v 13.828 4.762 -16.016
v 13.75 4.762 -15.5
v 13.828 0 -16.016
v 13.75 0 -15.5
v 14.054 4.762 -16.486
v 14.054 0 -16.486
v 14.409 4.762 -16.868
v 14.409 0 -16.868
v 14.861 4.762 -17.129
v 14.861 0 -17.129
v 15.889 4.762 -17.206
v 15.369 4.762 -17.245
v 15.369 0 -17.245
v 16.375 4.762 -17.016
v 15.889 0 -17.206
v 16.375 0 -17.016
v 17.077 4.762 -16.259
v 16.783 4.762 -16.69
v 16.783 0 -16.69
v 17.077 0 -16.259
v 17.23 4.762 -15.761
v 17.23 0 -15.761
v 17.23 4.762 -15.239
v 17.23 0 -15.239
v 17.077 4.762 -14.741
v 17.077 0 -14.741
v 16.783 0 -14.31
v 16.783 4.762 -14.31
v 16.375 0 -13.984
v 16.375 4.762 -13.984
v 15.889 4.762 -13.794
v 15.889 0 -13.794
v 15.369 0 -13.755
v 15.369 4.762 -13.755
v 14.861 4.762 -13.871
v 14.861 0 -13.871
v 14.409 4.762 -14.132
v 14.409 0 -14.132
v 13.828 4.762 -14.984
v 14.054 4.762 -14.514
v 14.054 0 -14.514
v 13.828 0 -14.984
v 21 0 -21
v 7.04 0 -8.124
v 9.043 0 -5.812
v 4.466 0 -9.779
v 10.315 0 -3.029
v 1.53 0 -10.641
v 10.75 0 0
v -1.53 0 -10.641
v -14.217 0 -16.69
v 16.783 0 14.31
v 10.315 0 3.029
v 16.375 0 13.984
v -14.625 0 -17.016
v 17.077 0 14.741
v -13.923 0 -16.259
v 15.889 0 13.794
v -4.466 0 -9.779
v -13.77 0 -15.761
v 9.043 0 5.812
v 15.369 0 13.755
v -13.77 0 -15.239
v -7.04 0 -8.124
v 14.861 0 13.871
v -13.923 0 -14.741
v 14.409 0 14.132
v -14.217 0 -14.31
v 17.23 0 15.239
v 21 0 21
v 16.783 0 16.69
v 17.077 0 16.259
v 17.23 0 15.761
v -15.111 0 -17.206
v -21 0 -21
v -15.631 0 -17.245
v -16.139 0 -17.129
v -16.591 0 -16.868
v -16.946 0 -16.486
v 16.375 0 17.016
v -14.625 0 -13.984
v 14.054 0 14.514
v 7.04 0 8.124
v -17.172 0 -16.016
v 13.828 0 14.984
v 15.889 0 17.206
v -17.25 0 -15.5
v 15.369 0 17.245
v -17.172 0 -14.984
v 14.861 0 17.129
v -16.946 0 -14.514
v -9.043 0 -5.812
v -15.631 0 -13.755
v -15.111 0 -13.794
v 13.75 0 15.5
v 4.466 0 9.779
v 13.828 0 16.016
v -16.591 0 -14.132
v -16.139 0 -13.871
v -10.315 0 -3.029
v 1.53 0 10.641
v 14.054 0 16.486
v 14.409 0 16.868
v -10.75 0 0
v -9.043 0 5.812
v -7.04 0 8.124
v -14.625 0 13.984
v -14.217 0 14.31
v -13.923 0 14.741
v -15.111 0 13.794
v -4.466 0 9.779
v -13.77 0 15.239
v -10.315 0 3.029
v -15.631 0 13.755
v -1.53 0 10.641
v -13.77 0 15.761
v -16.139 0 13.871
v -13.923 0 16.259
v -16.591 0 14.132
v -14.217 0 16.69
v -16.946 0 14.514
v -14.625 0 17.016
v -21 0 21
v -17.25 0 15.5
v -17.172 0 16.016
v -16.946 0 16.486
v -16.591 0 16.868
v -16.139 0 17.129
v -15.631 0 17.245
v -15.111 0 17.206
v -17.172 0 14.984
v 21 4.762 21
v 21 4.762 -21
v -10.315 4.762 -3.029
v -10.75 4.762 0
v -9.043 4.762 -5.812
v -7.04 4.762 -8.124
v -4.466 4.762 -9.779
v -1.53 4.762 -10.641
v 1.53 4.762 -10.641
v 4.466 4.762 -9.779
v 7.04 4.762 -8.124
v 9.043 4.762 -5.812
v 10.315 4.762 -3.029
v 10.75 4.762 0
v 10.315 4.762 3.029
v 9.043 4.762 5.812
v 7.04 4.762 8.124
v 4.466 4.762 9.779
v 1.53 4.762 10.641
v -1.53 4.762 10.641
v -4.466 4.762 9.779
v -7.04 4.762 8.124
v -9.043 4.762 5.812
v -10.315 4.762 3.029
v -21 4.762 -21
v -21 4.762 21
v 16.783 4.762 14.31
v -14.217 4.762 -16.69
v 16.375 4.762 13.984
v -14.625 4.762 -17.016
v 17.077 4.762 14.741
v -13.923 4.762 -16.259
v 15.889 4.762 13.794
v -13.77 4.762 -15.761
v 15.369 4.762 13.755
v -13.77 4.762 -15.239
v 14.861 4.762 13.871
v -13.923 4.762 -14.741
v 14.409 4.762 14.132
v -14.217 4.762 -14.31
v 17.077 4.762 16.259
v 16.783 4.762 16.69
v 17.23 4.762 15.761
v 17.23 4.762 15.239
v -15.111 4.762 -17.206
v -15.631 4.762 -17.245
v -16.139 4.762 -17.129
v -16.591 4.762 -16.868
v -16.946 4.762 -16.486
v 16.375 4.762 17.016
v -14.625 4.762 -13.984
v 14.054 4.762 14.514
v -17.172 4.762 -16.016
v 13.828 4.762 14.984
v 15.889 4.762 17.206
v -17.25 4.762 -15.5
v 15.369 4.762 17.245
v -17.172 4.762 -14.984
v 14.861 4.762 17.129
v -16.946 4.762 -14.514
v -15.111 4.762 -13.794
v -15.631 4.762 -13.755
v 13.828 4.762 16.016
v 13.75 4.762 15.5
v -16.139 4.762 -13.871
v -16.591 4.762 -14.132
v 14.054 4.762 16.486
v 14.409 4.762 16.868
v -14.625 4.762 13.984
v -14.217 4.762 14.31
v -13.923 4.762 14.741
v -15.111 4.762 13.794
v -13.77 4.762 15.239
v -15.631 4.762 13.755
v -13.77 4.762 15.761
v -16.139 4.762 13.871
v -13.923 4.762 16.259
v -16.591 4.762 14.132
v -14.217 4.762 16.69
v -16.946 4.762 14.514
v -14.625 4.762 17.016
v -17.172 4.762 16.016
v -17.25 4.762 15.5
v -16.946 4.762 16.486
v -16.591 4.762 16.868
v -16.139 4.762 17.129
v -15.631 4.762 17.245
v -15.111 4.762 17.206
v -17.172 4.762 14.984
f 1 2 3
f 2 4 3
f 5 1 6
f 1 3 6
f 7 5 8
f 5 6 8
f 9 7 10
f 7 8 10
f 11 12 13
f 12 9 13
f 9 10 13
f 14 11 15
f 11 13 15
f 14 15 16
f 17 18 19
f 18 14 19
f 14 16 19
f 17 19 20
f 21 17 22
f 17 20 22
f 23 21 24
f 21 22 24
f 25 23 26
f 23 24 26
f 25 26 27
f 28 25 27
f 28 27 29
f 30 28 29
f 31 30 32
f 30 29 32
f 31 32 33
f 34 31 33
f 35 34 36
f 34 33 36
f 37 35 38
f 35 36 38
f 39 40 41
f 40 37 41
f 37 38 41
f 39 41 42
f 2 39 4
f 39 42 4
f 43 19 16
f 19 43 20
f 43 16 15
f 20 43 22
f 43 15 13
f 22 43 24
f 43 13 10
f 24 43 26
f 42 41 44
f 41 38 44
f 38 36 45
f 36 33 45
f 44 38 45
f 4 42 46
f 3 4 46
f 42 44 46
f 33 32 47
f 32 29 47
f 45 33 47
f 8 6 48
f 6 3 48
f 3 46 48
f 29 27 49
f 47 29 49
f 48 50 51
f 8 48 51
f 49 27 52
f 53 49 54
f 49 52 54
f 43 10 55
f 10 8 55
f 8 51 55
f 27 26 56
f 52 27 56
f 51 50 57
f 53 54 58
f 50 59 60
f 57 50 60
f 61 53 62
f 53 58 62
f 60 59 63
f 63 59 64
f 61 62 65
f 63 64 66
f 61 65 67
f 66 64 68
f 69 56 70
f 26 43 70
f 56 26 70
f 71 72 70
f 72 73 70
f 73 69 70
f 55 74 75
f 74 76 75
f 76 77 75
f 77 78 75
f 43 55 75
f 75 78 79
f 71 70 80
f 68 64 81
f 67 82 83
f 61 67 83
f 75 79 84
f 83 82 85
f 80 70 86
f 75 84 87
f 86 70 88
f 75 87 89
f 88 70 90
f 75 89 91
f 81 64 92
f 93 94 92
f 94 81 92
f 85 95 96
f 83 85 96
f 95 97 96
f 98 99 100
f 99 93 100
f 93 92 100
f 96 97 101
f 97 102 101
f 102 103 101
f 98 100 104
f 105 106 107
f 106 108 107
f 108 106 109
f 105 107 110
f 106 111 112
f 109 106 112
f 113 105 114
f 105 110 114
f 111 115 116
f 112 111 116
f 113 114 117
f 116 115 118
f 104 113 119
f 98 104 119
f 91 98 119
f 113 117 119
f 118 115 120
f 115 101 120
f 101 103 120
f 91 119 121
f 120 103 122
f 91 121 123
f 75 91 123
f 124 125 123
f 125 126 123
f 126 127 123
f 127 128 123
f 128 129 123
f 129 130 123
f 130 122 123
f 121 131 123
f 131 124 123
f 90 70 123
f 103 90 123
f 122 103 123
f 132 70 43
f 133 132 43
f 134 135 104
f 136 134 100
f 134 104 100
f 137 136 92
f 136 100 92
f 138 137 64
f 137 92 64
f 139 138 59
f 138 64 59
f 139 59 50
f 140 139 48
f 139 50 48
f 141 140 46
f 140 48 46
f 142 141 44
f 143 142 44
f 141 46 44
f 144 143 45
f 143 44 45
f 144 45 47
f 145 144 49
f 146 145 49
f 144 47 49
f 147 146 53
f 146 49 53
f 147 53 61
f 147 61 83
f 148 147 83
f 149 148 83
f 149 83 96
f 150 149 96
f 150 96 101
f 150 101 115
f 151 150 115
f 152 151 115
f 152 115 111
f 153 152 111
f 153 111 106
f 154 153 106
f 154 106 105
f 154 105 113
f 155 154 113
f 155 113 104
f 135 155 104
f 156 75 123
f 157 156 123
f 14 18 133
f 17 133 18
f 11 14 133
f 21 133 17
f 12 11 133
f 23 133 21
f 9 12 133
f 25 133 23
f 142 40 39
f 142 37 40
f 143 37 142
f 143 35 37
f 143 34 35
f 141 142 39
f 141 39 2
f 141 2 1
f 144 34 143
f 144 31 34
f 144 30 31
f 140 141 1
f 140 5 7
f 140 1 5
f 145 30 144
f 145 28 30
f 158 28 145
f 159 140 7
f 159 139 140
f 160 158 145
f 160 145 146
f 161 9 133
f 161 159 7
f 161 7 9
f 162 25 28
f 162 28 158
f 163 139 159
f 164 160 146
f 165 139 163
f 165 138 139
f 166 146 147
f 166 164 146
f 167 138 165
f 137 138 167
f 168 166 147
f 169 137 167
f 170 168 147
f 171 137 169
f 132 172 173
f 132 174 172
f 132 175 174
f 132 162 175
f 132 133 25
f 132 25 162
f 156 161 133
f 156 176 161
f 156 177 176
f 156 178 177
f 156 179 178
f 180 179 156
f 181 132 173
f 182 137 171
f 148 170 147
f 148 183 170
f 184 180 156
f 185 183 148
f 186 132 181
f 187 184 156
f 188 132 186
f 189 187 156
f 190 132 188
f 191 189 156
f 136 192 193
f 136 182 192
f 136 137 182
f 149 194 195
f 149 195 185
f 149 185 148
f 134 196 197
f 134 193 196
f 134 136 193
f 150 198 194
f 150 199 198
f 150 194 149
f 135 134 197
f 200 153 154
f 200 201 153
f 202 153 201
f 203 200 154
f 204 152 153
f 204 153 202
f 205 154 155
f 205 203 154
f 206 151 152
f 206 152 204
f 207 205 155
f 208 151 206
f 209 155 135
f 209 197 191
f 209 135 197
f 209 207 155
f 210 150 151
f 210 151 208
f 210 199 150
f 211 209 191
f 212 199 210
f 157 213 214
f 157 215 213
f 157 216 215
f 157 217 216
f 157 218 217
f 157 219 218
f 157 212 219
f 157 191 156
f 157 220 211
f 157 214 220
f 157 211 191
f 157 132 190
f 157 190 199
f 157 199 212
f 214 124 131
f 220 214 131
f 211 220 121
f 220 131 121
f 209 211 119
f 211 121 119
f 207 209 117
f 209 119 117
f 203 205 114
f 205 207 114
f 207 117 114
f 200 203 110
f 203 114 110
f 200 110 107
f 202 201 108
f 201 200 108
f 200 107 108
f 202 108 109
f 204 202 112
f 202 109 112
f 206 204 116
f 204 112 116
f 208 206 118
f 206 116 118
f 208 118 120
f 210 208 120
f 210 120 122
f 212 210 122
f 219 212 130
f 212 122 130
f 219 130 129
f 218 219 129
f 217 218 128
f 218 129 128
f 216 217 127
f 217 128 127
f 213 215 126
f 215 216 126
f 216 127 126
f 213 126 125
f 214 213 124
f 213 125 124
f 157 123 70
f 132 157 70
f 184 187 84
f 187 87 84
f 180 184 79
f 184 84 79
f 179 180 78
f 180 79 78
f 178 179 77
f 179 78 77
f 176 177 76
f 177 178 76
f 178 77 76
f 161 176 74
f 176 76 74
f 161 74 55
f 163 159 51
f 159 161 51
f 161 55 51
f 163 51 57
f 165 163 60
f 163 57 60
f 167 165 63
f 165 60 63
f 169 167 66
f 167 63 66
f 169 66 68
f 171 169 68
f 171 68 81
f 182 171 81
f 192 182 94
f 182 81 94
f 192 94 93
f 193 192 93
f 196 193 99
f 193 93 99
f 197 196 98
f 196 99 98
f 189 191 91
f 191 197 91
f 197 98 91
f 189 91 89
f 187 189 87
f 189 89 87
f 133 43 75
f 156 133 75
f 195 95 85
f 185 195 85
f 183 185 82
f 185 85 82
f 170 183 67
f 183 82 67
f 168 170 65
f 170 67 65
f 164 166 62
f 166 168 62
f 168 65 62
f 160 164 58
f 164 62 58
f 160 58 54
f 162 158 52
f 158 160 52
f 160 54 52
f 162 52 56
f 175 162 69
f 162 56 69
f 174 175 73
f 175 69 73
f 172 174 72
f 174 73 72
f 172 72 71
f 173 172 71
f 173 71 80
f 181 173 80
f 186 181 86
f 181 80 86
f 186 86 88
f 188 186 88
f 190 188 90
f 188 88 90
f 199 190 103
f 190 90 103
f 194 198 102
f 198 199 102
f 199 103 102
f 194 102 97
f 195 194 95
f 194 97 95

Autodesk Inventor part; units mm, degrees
ref_plane "YZ Plane" through (0, 0, 0) normal (1, 0, 0) x (0, 1, 0)
ref_plane "XZ Plane" through (0, 0, 0) normal (0, 1, 0) x (-1, 0, 0)
ref_plane "XY Plane" through (0, 0, 0) normal (0, 0, 1) x (1, 0, 0)
sketch "Sketch1" plane through (0, 0, 0) normal (0, 1, 0) x (-1, 0, 0)
  line L0 (-21, -21) -> (21, -21)
  line L1 (21, -21) -> (21, 21)
  line L2 (21, 21) -> (-21, 21)
  line L3 (-21, 21) -> (-21, -21)
  line L4 (-21, -21) -> (21, 21) construction
  line L5 (21, -21) -> (-21, 21) construction
  circle A0 centre (15.5, 15.5) radius 1.75
  circle A1 centre (0, 0) radius 10.75
  line L6 (34.796, 0) -> (-29.6686, 0)
  line L7 (0, -38.1967) -> (0, 38.2612)
  circle A2 centre (15.5, -15.5) radius 1.75
  circle A3 centre (-15.5, 15.5) radius 1.75
  circle A4 centre (-15.5, -15.5) radius 1.75
  dimension "d0" = 42
  dimension "d1" = 42
  dimension "d4" = 3.5
  dimension "d8" = 21.5
  dimension "d13" = 31
extrude "Extrusion4" add sketch "Sketch1" along normal blind 4.7625 contours L3 L6 A1 L7 L0 | L7 A1 L6 L1 L0 | L3 L2 L7 A1 L6 | L6 A1 L7 L2 L1
equation "\"d0\" = d1"
properties part number "Vertical_Lead_Screw_Shaft_Mount_Plate_End"
